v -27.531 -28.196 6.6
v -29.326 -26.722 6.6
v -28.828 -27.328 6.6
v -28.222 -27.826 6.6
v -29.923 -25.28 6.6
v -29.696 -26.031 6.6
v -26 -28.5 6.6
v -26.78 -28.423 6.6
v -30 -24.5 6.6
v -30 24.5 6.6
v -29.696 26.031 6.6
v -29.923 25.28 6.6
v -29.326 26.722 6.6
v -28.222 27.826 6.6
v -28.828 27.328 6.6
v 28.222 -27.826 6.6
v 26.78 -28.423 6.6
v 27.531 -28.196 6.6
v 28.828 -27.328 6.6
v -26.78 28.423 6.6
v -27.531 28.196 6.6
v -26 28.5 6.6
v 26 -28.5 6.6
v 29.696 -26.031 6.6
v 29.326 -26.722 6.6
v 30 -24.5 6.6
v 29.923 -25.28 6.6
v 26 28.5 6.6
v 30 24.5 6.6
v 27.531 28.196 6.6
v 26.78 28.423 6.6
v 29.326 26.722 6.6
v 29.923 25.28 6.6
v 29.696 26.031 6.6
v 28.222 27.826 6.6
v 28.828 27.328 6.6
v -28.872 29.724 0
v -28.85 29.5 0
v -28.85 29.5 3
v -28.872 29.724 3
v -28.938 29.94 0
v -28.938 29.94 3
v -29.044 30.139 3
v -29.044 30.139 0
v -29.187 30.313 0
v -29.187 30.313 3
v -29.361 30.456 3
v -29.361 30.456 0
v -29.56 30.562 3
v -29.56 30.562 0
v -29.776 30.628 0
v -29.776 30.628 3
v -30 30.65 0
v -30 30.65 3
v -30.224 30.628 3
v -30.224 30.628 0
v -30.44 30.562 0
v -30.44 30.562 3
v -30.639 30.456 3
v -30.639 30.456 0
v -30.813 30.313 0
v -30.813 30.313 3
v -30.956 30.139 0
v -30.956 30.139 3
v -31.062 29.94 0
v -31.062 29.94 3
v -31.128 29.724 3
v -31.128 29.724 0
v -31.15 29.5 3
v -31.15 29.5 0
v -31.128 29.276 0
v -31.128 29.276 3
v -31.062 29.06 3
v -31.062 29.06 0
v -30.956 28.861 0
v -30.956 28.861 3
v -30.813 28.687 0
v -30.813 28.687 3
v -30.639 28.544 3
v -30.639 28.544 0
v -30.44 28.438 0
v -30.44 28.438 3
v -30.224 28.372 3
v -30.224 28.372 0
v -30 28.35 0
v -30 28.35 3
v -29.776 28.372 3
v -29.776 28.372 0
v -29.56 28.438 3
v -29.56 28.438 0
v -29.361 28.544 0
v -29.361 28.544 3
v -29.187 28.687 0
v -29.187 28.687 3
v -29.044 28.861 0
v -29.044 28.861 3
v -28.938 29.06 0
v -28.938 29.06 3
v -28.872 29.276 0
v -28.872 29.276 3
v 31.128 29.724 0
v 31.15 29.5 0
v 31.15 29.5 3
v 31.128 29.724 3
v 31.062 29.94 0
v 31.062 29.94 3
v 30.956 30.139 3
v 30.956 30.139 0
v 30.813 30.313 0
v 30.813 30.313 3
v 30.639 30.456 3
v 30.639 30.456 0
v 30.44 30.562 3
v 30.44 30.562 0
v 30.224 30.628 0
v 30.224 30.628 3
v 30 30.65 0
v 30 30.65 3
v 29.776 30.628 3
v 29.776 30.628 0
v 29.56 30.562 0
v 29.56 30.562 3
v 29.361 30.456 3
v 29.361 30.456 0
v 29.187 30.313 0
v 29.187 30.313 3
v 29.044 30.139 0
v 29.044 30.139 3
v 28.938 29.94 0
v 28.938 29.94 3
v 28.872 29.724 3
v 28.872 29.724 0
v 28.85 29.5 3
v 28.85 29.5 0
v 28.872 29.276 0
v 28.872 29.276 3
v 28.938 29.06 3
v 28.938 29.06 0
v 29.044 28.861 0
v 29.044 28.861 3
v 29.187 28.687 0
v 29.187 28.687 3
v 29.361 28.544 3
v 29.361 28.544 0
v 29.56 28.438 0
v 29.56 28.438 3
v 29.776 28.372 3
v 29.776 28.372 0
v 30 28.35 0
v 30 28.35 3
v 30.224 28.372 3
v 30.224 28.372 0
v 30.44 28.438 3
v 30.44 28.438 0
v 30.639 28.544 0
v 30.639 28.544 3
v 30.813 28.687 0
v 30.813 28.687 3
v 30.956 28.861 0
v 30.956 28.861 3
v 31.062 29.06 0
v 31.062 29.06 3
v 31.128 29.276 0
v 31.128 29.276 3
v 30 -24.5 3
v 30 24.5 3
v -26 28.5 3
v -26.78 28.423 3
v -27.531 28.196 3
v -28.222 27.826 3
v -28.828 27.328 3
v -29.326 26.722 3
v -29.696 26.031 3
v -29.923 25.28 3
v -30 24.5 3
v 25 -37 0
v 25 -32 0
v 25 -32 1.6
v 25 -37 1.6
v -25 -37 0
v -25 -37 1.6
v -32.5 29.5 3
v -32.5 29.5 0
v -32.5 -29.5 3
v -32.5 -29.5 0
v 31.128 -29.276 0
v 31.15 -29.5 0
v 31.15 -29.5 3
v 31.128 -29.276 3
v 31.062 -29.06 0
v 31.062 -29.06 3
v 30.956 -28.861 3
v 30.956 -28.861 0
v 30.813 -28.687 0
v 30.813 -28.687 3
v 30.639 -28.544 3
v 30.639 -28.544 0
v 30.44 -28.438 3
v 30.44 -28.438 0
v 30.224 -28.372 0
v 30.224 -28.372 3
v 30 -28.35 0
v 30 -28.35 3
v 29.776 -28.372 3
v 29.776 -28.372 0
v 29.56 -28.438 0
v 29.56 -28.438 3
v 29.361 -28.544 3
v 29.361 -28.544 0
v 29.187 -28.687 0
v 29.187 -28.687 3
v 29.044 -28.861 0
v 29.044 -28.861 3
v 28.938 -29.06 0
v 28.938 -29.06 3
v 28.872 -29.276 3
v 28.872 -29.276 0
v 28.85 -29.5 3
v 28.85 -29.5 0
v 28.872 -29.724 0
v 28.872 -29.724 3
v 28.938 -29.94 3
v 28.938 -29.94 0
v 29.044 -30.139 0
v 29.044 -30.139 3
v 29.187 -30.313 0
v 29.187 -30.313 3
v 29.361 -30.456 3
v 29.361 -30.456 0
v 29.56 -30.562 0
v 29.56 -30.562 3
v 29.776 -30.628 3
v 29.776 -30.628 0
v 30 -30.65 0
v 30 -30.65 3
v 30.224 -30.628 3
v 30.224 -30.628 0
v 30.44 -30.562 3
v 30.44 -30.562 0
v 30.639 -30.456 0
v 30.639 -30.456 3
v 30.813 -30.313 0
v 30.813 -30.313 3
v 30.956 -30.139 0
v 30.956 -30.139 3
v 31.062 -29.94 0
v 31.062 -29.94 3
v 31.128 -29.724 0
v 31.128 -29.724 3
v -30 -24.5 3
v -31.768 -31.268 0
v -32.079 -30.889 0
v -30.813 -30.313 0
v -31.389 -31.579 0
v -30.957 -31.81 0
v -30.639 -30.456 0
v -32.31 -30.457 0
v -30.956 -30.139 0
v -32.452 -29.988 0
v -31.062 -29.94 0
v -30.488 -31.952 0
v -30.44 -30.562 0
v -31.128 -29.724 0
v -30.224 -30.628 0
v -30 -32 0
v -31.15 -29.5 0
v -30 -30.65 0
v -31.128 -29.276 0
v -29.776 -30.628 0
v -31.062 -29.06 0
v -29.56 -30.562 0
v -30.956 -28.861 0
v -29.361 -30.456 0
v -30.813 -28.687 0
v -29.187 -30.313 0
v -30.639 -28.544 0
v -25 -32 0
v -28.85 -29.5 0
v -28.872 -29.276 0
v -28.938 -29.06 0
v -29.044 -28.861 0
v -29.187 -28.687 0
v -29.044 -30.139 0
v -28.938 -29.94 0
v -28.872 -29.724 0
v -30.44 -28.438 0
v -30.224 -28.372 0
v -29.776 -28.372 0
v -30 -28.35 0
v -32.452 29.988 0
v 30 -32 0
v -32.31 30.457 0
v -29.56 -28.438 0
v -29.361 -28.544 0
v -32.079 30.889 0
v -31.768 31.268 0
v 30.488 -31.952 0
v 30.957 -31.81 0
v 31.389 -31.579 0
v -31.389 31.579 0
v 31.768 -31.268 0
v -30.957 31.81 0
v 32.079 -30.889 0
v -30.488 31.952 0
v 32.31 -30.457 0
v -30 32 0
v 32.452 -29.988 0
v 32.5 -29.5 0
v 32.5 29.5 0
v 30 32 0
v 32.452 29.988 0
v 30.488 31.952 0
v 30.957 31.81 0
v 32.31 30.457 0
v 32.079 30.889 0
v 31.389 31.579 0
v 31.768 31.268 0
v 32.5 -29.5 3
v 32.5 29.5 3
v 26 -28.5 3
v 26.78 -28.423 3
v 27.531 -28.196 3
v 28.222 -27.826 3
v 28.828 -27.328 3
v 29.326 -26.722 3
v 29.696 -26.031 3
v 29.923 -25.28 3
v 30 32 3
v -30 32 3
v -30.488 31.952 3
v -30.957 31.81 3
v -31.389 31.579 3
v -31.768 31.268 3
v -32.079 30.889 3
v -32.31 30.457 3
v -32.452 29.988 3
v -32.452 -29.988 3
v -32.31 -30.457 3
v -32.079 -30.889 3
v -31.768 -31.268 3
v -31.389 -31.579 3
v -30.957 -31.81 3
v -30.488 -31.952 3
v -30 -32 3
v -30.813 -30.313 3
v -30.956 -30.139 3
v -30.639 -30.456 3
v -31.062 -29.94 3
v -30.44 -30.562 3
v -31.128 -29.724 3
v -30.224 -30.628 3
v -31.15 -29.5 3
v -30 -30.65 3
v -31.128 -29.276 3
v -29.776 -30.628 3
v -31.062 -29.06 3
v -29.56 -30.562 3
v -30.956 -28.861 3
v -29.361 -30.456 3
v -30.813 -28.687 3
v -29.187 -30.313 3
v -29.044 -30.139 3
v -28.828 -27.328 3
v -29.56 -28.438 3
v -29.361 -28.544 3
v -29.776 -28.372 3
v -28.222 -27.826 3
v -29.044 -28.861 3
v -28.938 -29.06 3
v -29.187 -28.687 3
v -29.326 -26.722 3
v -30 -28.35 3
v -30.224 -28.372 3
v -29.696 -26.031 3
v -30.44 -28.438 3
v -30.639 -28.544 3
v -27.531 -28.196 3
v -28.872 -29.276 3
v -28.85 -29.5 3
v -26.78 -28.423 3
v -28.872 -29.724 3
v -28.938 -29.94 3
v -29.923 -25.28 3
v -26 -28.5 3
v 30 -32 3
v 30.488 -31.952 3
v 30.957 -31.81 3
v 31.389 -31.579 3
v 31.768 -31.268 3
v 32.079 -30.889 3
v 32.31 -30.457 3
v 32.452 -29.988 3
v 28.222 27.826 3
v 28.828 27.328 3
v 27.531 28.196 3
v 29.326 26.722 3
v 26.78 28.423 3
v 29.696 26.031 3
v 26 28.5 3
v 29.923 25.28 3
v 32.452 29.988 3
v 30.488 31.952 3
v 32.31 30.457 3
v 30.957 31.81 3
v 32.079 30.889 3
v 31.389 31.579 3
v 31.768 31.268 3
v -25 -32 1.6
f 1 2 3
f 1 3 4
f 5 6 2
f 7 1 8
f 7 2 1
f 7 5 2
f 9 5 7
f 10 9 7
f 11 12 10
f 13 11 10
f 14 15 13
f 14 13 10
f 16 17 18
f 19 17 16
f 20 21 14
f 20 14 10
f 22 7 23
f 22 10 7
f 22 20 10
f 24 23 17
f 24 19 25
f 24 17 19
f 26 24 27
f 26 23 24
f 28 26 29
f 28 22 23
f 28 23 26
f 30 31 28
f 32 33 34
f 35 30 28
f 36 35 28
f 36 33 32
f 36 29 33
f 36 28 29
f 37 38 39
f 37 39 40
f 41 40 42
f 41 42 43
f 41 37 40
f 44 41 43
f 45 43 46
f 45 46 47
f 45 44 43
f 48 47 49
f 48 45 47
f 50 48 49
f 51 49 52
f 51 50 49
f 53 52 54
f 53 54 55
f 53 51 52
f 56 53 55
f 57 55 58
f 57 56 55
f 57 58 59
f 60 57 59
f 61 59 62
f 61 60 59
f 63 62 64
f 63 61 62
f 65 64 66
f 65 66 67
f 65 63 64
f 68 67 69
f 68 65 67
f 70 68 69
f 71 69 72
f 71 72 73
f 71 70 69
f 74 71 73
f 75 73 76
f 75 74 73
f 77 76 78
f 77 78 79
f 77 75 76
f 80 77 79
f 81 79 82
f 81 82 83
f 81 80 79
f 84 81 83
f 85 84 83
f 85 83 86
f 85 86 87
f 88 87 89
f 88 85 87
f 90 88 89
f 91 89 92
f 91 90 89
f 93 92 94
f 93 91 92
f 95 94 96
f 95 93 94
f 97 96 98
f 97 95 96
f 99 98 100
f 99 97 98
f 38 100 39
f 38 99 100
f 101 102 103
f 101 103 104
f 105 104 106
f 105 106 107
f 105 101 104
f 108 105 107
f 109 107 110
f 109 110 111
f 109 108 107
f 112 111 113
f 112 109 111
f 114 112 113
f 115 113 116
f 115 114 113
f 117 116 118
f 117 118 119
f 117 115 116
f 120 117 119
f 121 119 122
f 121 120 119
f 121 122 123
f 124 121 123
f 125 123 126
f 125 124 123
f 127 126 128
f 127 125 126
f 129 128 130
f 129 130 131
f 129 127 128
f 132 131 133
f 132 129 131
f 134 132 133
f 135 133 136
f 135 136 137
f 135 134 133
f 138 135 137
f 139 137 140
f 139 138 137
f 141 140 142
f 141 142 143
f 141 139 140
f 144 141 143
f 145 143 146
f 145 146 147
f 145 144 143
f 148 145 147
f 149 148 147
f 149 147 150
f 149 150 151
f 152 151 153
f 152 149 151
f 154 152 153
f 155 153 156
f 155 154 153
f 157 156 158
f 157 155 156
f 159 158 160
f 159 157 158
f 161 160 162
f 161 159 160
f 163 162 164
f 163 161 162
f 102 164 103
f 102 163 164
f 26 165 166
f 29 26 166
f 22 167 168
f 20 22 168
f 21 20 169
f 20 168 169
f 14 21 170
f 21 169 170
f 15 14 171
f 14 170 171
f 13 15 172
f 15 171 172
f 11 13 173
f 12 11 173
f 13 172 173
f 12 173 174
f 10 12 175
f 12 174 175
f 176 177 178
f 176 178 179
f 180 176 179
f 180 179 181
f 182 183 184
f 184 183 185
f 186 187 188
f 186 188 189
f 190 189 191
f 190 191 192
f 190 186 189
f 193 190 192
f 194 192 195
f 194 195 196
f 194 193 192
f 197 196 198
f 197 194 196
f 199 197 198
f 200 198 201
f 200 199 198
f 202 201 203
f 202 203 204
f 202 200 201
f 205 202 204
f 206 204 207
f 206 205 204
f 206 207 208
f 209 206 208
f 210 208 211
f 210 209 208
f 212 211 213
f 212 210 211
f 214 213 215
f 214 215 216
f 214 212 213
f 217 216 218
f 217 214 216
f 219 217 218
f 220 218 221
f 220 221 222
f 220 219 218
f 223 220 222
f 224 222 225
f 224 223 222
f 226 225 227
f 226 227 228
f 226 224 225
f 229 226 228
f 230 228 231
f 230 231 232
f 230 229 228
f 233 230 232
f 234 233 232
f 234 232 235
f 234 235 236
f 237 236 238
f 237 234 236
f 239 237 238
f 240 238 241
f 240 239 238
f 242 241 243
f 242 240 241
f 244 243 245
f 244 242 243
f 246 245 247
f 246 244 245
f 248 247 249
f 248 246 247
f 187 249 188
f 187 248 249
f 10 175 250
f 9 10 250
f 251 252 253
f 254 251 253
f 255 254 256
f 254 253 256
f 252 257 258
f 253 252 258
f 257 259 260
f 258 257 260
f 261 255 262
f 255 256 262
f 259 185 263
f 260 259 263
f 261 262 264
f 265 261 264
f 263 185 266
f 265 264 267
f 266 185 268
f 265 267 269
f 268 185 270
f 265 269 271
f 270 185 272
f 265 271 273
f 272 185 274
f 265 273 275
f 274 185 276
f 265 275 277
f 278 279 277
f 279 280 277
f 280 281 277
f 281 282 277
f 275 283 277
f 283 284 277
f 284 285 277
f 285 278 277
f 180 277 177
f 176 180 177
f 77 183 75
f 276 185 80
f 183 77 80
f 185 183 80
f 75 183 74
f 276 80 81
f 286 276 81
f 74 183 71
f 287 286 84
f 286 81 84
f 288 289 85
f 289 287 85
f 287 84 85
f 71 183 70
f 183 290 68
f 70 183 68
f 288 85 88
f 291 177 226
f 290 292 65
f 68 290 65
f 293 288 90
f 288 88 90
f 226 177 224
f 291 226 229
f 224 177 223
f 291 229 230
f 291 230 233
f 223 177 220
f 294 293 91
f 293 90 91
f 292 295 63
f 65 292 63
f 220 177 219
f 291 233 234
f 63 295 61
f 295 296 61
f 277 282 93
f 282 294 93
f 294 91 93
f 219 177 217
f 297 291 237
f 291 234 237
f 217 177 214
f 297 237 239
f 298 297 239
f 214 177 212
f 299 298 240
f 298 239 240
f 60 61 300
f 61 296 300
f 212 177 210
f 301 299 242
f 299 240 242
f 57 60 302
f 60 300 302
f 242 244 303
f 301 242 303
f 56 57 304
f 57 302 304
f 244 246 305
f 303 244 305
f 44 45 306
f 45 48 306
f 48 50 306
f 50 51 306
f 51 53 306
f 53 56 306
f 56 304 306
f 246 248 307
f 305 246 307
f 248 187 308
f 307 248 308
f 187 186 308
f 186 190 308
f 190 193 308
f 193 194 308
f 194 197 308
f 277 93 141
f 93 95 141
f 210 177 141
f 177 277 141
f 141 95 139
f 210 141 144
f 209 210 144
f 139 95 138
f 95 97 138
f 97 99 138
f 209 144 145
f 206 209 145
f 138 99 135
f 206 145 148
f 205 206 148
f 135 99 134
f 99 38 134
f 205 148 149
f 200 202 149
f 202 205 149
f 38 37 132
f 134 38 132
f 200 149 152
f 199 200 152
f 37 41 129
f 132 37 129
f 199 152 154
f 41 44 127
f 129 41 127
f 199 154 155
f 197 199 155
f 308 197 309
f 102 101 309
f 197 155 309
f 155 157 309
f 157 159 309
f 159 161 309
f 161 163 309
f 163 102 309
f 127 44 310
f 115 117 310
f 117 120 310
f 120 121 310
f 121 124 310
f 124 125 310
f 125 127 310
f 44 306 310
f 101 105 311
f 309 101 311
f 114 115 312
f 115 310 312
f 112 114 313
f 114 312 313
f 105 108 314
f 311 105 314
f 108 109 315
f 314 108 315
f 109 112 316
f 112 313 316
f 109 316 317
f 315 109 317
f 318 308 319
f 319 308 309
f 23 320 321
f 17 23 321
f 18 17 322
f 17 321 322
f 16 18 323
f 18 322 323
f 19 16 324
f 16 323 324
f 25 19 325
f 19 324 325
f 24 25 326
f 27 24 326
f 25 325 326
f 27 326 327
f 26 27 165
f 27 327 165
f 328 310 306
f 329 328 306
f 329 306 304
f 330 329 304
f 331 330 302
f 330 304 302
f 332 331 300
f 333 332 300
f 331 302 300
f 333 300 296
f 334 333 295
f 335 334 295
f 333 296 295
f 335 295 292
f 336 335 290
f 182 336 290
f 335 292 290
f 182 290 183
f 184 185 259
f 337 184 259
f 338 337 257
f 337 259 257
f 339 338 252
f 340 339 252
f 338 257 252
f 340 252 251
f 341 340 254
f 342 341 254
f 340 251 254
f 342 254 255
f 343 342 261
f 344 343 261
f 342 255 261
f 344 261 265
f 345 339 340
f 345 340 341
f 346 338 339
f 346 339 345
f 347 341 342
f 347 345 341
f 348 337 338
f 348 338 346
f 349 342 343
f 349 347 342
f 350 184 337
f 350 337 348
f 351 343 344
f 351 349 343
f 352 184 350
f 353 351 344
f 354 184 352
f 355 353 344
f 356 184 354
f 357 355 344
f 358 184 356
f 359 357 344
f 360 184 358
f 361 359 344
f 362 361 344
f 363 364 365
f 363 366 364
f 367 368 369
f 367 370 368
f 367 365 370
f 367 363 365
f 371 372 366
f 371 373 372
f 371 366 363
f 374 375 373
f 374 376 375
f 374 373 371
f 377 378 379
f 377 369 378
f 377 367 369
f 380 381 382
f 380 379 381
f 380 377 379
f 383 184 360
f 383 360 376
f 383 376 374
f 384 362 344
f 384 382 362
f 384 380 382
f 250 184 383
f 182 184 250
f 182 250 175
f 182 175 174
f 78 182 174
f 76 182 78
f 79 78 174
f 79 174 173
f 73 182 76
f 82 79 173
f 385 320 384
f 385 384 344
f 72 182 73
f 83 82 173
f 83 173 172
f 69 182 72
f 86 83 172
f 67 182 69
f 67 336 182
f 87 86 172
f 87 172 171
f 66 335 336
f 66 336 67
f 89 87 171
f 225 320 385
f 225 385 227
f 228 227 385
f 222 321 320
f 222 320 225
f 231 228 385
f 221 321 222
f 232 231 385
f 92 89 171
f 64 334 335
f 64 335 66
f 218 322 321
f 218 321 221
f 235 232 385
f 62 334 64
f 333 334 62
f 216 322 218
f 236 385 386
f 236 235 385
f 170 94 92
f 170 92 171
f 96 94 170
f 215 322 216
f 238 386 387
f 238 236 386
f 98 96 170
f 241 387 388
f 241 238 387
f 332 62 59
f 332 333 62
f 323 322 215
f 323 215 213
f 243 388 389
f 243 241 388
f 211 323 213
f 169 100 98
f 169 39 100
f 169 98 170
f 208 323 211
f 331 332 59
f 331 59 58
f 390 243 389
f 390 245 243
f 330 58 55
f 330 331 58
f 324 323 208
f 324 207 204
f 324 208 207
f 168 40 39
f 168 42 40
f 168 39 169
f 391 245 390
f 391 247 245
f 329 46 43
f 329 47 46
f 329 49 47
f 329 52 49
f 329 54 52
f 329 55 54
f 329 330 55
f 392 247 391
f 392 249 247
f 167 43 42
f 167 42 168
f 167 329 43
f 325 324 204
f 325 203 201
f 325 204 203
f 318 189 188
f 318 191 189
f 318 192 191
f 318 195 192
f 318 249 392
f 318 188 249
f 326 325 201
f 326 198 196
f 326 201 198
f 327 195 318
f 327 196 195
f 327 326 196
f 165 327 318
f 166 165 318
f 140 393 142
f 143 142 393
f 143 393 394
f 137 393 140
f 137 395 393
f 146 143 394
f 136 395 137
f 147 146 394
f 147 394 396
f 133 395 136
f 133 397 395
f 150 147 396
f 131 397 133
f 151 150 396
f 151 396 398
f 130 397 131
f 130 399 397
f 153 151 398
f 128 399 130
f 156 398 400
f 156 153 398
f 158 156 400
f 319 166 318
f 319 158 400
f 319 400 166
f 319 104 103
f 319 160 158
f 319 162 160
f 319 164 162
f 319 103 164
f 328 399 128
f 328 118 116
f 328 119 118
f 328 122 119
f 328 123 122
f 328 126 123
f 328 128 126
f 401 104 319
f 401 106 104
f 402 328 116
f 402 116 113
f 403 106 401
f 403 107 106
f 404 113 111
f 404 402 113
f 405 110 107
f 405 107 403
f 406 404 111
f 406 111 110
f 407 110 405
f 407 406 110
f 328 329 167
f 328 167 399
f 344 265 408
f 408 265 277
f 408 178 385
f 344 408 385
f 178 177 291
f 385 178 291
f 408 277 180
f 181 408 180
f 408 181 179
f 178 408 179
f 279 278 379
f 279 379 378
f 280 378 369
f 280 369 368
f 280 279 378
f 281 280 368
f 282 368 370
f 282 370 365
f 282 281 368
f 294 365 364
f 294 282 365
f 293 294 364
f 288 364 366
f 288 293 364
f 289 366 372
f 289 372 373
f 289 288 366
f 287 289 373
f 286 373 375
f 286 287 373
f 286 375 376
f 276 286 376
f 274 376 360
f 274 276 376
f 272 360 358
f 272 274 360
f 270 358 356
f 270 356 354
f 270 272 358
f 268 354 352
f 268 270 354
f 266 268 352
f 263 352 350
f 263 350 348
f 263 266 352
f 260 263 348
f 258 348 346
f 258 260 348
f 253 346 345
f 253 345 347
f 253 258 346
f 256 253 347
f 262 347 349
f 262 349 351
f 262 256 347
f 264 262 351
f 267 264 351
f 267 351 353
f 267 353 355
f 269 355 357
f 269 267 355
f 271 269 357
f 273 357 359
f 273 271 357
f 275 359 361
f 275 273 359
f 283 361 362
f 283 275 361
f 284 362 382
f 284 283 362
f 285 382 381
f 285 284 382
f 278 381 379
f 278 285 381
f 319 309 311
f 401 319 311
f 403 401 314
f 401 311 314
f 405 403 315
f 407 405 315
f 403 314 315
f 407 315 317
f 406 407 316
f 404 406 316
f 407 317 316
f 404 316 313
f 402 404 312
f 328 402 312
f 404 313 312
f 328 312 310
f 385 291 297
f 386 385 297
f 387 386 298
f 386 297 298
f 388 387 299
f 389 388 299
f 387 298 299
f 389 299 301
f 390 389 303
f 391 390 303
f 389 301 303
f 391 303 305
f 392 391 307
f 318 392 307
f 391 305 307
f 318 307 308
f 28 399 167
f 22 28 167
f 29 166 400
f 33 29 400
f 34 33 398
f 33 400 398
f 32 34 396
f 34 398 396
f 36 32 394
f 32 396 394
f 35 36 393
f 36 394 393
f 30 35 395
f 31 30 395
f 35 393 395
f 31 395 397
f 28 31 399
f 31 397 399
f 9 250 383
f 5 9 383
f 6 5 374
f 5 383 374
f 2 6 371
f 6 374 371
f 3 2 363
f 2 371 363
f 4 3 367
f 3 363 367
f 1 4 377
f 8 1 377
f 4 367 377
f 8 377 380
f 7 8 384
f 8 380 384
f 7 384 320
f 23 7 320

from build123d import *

# Parameters (mm, degrees)
F0_R     = 1.15
F1_DEPTH = 3
F3_DEPTH = 3.6
F4_W     = 25
F4_H     = 5
F5_DEPTH = 1.6


with BuildPart() as f1:
    # F0 (on Top) → F1 (new body)
    with BuildSketch(Plane.XY):
        with BuildLine():
            ThreePointArc((-32.5, -29.5), (-31.767767, -31.267767), (-30, -32))
            Line((-30, -32), (30, -32))
            ThreePointArc((30, -32), (31.767767, -31.267767), (32.5, -29.5))
            Line((32.5, -29.5), (32.5, 29.5))
            ThreePointArc((32.5, 29.5), (31.767767, 31.267767), (30, 32))
            Line((30, 32), (-30, 32))
            ThreePointArc((-30, 32), (-31.767767, 31.267767), (-32.5, 29.5))
            Line((-32.5, 29.5), (-32.5, -29.5))
        make_face()
        with Locations((-30, -29.5)):
            Circle(F0_R, mode=Mode.SUBTRACT)
        with Locations((30, -29.5)):
            Circle(F0_R, mode=Mode.SUBTRACT)
        with Locations((-30, 29.5)):
            Circle(F0_R, mode=Mode.SUBTRACT)
        with Locations((30, 29.5)):
            Circle(F0_R, mode=Mode.SUBTRACT)
    extrude(amount=F1_DEPTH)

    # F2 (on face) → F3 (join)
    with BuildSketch(Plane.XY.offset(3)):
        with BuildLine():
            Line((26, 28.5), (-26, 28.5))
            ThreePointArc((-26, 28.5), (-28.828427, 27.328427), (-30, 24.5))
            Line((-30, 24.5), (-30, -24.5))
            ThreePointArc((-30, -24.5), (-28.828427, -27.328427), (-26, -28.5))
            Line((-26, -28.5), (26, -28.5))
            ThreePointArc((26, -28.5), (28.828427, -27.328427), (30, -24.5))
            Line((30, -24.5), (30, 24.5))
            ThreePointArc((30, 24.5), (28.828427, 27.328427), (26, 28.5))
        make_face()
    extrude(amount=F3_DEPTH)

    # F4 (on face) → F5 (join)
    with BuildSketch(Plane(origin=(0, 0, 0), x_dir=(1, 0, 0), z_dir=(0, 0, -1))):
        with Locations((-12.5, 34.5)):
            Rectangle(F4_W, F4_H)
        with Locations((12.5, 34.5)):
            Rectangle(F4_W, F4_H)
    extrude(amount=-F5_DEPTH)


solid = f1.part
